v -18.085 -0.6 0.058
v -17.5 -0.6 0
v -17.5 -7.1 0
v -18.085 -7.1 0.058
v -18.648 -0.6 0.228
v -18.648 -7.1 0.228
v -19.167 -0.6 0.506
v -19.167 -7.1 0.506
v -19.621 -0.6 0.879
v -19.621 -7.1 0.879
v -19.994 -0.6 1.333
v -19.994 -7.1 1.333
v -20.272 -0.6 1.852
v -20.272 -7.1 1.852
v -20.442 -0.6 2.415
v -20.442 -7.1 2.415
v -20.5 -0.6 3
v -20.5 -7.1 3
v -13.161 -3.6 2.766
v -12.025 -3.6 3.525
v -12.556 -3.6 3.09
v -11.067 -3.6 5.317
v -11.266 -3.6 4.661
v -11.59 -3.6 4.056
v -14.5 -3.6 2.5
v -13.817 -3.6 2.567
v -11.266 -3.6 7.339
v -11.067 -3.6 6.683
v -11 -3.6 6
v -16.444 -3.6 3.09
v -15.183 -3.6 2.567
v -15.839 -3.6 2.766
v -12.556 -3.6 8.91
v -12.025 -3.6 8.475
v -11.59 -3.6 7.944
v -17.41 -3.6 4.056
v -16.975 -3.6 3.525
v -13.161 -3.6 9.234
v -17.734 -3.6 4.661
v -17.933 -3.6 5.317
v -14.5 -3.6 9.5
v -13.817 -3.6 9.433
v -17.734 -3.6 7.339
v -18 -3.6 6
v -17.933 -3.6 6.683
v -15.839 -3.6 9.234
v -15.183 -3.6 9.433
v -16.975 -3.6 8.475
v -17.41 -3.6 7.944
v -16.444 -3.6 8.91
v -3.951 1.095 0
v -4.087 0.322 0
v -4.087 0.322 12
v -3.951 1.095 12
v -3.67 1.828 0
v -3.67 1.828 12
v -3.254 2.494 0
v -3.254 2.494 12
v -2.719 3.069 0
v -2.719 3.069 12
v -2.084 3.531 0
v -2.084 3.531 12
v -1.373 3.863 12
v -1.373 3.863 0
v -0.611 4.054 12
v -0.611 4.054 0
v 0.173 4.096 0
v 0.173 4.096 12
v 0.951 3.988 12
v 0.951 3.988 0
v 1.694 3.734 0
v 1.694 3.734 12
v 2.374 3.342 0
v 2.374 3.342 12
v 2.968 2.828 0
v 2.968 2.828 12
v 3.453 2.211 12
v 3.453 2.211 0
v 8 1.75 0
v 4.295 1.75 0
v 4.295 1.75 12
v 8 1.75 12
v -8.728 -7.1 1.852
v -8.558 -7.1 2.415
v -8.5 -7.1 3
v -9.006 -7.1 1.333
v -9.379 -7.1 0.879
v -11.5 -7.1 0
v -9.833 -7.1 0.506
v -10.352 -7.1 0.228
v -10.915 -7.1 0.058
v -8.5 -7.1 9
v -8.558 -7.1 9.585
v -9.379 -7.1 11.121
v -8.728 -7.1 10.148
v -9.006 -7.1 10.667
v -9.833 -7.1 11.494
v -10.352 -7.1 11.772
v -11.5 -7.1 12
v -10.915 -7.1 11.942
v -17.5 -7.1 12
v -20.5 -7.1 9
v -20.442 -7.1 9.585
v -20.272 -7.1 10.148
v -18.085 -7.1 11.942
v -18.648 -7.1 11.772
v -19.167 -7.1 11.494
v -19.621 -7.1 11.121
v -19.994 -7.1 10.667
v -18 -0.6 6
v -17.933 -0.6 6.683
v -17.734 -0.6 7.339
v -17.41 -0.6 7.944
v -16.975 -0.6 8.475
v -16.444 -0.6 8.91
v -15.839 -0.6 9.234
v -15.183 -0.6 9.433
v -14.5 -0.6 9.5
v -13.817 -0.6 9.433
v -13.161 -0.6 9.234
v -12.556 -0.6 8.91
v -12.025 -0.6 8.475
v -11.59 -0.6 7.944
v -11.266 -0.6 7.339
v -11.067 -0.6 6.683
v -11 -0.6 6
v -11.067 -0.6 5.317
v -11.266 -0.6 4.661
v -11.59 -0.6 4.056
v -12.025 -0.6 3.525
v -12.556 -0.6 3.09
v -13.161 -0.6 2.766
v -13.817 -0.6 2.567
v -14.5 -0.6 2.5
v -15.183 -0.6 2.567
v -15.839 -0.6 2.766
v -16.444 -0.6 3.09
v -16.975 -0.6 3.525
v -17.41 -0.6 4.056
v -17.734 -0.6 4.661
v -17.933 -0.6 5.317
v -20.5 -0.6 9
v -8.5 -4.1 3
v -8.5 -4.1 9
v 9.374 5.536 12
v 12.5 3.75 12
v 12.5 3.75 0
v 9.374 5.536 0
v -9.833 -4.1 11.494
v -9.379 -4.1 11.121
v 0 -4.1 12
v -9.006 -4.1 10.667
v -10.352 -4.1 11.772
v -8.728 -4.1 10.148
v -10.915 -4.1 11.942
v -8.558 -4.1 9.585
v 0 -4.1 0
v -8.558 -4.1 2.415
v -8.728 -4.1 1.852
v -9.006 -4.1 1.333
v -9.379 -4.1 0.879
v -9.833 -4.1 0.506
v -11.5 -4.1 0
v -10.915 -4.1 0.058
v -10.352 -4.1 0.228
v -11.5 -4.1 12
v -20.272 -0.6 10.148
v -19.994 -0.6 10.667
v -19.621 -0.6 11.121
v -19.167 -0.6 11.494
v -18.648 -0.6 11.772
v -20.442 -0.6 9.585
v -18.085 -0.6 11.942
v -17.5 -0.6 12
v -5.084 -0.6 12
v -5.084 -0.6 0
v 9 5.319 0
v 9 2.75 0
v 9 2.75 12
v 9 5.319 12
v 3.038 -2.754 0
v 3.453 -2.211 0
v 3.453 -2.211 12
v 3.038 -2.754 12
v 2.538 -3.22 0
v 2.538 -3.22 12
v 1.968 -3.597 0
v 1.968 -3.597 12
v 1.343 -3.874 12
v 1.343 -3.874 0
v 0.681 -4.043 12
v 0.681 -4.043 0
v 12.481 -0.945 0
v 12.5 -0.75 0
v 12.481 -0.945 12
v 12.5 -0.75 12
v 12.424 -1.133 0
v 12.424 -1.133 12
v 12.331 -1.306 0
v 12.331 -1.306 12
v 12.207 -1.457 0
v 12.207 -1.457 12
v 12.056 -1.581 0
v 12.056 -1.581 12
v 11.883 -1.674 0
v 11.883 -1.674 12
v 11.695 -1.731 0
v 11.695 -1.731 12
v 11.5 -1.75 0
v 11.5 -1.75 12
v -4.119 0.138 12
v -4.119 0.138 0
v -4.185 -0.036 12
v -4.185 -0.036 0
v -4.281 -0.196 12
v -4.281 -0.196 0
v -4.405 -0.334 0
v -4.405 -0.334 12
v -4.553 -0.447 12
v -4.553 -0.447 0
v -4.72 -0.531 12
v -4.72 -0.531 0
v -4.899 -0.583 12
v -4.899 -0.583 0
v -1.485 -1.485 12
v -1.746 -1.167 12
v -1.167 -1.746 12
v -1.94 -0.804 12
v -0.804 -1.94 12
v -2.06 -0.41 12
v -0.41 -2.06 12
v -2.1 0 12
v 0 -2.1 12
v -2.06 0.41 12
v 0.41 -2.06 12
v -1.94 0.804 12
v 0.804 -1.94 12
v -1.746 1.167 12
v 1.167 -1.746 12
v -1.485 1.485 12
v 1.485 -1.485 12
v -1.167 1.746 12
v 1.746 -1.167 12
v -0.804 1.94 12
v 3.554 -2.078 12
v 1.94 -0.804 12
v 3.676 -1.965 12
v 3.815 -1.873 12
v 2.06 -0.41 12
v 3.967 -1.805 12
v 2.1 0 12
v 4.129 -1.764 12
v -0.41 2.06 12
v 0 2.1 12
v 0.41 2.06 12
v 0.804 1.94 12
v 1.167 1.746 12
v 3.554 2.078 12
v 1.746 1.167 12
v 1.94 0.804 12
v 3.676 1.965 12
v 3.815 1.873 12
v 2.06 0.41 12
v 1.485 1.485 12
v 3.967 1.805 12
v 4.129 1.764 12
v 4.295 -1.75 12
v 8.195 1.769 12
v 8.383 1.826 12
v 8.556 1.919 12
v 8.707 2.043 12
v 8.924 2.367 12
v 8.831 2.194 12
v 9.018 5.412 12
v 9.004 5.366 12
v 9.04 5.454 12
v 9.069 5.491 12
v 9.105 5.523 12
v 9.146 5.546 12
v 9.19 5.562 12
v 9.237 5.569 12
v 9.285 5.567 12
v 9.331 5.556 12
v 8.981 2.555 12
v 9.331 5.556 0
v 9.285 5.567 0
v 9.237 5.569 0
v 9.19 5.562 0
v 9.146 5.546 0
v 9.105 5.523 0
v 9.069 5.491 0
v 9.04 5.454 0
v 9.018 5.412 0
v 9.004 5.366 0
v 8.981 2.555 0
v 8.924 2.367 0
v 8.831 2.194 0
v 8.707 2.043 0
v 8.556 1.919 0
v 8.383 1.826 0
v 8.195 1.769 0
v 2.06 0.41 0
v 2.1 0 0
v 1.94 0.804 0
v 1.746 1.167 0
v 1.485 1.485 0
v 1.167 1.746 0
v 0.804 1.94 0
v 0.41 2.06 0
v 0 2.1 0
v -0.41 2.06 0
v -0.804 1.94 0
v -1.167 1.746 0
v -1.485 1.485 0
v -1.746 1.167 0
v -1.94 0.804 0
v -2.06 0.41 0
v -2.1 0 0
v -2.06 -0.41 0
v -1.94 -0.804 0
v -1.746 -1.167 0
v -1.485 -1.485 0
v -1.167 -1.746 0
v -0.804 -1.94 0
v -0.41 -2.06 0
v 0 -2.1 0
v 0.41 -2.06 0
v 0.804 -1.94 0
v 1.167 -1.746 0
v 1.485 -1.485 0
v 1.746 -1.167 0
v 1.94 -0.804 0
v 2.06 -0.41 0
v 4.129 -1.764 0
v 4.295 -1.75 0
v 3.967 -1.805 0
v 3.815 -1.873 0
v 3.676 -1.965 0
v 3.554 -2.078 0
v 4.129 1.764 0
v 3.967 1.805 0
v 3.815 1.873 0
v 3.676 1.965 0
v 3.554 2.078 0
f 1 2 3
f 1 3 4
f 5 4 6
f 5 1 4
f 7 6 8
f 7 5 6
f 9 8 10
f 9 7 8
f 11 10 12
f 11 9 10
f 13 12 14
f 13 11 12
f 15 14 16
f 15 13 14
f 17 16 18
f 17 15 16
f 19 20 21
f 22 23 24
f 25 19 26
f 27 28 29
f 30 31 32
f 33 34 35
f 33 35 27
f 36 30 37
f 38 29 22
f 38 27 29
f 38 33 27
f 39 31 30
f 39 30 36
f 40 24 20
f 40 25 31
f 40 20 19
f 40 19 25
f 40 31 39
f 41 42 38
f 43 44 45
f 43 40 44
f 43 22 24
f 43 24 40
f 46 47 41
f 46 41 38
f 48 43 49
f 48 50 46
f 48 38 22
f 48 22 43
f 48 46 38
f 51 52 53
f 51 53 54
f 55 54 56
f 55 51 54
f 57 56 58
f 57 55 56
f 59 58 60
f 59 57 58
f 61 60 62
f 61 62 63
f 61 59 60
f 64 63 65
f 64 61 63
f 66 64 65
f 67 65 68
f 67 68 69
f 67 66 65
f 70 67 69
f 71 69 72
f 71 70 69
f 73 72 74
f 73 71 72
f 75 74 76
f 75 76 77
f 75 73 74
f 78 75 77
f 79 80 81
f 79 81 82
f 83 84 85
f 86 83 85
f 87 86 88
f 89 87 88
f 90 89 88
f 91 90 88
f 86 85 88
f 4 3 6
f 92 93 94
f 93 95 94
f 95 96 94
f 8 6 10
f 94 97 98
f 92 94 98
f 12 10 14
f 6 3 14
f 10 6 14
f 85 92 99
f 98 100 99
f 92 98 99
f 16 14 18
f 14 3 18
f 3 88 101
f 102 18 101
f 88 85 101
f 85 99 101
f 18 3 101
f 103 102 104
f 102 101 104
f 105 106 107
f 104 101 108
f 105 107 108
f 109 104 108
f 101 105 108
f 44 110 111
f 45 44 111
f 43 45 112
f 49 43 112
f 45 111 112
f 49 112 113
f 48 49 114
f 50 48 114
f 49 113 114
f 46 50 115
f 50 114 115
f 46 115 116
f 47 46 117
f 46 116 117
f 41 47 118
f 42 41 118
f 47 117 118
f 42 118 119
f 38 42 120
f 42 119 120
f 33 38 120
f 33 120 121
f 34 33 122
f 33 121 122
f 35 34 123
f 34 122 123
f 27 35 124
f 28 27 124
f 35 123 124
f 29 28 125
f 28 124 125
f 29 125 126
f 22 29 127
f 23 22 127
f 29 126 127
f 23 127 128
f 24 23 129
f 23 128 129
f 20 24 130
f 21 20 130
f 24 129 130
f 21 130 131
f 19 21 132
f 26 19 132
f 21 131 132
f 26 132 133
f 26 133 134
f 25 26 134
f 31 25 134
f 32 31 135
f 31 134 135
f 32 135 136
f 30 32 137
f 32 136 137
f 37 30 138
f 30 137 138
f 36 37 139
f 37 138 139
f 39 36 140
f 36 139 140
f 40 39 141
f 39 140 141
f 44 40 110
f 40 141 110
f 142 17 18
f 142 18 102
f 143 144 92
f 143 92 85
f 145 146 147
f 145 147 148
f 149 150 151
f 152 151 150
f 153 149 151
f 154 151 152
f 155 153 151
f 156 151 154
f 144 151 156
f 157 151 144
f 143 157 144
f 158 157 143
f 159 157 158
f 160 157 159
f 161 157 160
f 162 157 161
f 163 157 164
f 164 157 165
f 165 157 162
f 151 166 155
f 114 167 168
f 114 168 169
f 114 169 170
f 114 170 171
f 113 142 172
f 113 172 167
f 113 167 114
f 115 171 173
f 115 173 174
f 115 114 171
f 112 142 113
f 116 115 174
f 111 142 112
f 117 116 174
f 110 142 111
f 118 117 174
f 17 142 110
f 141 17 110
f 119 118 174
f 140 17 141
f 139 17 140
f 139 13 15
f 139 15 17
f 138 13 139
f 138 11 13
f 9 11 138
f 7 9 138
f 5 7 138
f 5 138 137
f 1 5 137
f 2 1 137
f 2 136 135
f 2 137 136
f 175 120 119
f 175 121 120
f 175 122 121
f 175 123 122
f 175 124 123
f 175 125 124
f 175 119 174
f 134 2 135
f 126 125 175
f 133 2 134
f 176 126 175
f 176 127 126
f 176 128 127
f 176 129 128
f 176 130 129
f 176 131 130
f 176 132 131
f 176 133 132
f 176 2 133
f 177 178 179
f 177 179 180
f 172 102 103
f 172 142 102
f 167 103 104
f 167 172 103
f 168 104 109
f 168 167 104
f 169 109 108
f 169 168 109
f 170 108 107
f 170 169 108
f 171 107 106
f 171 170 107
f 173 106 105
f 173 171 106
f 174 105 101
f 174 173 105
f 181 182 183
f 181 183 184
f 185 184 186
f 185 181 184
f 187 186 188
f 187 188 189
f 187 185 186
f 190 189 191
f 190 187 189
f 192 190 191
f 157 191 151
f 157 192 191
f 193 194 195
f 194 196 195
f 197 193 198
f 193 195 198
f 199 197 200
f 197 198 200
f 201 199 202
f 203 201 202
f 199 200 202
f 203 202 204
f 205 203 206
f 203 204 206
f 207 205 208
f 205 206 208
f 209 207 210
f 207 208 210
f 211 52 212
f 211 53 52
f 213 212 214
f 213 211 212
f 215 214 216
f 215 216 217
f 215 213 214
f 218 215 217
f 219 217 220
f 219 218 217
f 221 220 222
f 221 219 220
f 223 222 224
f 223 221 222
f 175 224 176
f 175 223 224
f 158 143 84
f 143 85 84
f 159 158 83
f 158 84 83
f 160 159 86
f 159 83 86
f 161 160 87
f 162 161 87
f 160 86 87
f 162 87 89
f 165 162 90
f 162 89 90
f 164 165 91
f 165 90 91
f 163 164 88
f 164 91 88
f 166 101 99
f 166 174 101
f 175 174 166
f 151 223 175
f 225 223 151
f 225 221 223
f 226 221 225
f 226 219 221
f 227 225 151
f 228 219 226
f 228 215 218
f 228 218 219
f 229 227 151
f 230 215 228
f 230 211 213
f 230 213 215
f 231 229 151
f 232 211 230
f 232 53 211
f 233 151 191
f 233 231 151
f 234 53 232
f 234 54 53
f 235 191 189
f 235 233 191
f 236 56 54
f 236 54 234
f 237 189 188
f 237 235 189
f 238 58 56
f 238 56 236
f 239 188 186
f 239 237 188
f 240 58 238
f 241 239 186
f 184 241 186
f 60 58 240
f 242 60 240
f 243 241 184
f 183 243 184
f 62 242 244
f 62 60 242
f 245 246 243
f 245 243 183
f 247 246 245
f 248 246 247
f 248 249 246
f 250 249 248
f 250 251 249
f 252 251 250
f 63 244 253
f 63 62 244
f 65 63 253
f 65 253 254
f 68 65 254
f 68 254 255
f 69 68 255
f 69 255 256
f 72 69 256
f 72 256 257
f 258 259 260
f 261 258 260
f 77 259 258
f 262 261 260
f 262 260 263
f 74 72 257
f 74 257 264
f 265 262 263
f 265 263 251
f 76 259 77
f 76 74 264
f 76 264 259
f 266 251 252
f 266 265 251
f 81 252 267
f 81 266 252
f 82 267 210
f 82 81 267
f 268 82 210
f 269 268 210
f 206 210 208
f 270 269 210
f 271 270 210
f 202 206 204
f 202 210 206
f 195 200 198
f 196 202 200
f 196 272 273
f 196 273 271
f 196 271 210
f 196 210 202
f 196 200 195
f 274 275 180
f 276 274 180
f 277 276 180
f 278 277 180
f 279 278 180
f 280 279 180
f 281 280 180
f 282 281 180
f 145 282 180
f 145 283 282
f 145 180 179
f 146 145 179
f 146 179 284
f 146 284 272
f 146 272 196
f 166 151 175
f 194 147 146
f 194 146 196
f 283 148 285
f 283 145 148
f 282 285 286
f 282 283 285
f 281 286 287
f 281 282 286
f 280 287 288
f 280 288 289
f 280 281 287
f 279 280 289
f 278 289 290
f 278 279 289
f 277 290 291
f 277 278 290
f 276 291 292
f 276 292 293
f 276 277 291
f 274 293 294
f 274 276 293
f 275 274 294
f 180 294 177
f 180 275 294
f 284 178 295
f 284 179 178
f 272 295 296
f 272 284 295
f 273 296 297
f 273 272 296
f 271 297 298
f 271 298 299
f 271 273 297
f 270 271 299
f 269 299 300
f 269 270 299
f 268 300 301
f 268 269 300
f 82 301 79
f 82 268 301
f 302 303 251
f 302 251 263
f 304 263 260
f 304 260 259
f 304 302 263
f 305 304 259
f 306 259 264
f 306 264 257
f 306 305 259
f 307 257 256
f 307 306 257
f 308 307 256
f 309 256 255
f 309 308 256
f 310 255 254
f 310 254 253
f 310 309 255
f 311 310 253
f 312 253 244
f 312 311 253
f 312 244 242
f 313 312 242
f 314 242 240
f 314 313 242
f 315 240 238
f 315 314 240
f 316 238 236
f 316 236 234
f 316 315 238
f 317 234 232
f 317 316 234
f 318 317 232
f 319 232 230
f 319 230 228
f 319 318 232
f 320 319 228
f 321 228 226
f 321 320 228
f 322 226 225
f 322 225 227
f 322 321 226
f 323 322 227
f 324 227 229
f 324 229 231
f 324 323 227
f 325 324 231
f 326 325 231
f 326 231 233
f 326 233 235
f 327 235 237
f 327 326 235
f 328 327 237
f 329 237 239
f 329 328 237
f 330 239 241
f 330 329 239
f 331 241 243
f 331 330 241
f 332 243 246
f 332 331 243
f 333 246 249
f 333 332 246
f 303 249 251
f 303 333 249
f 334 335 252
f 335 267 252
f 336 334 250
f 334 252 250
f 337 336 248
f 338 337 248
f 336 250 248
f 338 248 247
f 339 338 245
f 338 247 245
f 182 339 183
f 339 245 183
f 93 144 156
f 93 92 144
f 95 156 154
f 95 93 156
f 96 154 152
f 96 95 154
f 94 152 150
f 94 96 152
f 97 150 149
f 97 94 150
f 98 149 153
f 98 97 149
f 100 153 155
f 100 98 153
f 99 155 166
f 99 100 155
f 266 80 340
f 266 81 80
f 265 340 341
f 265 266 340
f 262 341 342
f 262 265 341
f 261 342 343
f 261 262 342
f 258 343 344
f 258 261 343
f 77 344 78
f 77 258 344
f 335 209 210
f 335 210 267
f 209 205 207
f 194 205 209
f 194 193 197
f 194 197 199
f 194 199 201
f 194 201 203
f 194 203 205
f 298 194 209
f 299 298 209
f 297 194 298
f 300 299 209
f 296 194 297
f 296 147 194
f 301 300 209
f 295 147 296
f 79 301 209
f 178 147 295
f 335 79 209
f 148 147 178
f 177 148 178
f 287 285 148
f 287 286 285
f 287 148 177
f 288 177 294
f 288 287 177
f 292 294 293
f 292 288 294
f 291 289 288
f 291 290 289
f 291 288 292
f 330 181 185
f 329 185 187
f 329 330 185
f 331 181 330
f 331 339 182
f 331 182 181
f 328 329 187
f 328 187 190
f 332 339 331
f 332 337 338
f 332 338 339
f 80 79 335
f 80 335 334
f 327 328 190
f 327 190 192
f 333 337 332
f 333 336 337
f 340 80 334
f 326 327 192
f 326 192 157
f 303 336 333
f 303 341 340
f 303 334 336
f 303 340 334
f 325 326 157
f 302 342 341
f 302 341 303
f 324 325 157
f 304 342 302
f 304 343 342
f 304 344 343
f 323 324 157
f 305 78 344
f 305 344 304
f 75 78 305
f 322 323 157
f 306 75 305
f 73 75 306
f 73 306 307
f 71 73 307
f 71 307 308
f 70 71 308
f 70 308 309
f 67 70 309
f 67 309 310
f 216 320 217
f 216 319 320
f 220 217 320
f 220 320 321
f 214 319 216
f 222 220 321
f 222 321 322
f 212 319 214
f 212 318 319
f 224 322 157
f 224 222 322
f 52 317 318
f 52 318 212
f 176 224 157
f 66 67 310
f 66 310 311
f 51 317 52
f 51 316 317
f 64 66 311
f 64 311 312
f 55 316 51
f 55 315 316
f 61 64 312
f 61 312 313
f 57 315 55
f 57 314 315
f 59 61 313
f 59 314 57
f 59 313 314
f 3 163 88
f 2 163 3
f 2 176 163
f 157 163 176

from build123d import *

# Parameters (mm, degrees)
SKETCH1_R           = 2.1
BOSS_EXTRUDE1_DEPTH = 12
FILLET1_R           = 1
CUT_EXTRUDE1_DEPTH  = 12
FILLET3_R           = 0.25
FILLET4_R           = 3
BOSS_EXTRUDE2_DEPTH = 3
FILLET5_R           = 3
SKETCH7_R           = 3.5
CUT_EXTRUDE4_DEPTH  = 3


with BuildPart() as part:
    # Sketch1 → Boss-Extrude1 (new body)
    with BuildSketch(Plane.XY):
        with BuildLine():
            Line((12.5, 5.75), (12.5, -1.75))
            Line((12.5, -1.75), (3.707762128, -1.75))
            ThreePointArc((3.707762128, -1.75), (2.194880407, -3.463018914), (0, -4.1))
            Line((0, -4.1), (-20.5, -4.1))
            Line((-20.5, -4.1), (-20.5, -0.6))
            Line((-20.5, -0.6), (-4.055859958, -0.6))
            ThreePointArc((-4.055859958, -0.6), (-1.187820704, 3.924166405), (3.707762128, 1.75))
            Line((3.707762128, 1.75), (9, 1.75))
            Line((9, 1.75), (9, 5.75))
            Line((9, 5.75), (12.5, 5.75))
        make_face()
        Circle(SKETCH1_R, mode=Mode.SUBTRACT)
    extrude(amount=BOSS_EXTRUDE1_DEPTH)

    # Fillet1
    fillet1_edges = [part.edges().sort_by_distance(p)[0] for p in [
        (3.707762128, -1.75, 6),
        (12.5, -1.75, 6),
        (9, 1.75, 6),
        (3.707762128, 1.75, 6),
        (-4.055859958, -0.6, 6),
    ]]
    fillet(fillet1_edges, radius=FILLET1_R)

    # Sketch3 → Cut-Extrude1 (cut)
    with BuildSketch(Plane.XY.offset(12)):
        Polygon((9, 5.75), (12.5, 5.75), (12.5, 3.75), align=None)
    extrude(amount=-CUT_EXTRUDE1_DEPTH, mode=Mode.SUBTRACT)

    # Fillet3
    fillet3_edges = [part.edges().sort_by_distance(p)[0] for p in [
        (9, 5.75, 6),
    ]]
    fillet(fillet3_edges, radius=FILLET3_R)

    # Fillet4
    fillet4_edges = [part.edges().sort_by_distance(p)[0] for p in [
        (-20.5, -2.35, 0),
        (-20.5, -2.35, 12),
    ]]
    fillet(fillet4_edges, radius=FILLET4_R)

    # Sketch6 → Boss-Extrude2 (add)
    with BuildSketch(Plane.XZ.offset(4.1)):
        with BuildLine():
            Line((-8.5, 12), (-8.5, 0))
            Line((-8.5, 0), (-17.5, 0))
            ThreePointArc((-17.5, 0), (-19.621320344, 0.878679656), (-20.5, 3))
            Line((-20.5, 3), (-20.5, 9))
            ThreePointArc((-20.5, 9), (-19.621320344, 11.121320344), (-17.5, 12))
            Line((-17.5, 12), (-8.5, 12))
        make_face()
    extrude(amount=BOSS_EXTRUDE2_DEPTH)

    # Fillet5
    fillet5_edges = [part.edges().sort_by_distance(p)[0] for p in [
        (-8.5, -5.6, 0),
        (-8.5, -5.6, 12),
    ]]
    fillet(fillet5_edges, radius=FILLET5_R)

    # Sketch7 → Cut-Extrude4 (cut)
    with BuildSketch(Plane(origin=(0, -0.6, 0), x_dir=(1, 0, 0), z_dir=(0, 1, 0))):
        with Locations(Location((-14.5, -6, 0), (0, 0, 180))):
            Circle(SKETCH7_R)
    extrude(amount=-CUT_EXTRUDE4_DEPTH, mode=Mode.SUBTRACT)


solid = part.part
